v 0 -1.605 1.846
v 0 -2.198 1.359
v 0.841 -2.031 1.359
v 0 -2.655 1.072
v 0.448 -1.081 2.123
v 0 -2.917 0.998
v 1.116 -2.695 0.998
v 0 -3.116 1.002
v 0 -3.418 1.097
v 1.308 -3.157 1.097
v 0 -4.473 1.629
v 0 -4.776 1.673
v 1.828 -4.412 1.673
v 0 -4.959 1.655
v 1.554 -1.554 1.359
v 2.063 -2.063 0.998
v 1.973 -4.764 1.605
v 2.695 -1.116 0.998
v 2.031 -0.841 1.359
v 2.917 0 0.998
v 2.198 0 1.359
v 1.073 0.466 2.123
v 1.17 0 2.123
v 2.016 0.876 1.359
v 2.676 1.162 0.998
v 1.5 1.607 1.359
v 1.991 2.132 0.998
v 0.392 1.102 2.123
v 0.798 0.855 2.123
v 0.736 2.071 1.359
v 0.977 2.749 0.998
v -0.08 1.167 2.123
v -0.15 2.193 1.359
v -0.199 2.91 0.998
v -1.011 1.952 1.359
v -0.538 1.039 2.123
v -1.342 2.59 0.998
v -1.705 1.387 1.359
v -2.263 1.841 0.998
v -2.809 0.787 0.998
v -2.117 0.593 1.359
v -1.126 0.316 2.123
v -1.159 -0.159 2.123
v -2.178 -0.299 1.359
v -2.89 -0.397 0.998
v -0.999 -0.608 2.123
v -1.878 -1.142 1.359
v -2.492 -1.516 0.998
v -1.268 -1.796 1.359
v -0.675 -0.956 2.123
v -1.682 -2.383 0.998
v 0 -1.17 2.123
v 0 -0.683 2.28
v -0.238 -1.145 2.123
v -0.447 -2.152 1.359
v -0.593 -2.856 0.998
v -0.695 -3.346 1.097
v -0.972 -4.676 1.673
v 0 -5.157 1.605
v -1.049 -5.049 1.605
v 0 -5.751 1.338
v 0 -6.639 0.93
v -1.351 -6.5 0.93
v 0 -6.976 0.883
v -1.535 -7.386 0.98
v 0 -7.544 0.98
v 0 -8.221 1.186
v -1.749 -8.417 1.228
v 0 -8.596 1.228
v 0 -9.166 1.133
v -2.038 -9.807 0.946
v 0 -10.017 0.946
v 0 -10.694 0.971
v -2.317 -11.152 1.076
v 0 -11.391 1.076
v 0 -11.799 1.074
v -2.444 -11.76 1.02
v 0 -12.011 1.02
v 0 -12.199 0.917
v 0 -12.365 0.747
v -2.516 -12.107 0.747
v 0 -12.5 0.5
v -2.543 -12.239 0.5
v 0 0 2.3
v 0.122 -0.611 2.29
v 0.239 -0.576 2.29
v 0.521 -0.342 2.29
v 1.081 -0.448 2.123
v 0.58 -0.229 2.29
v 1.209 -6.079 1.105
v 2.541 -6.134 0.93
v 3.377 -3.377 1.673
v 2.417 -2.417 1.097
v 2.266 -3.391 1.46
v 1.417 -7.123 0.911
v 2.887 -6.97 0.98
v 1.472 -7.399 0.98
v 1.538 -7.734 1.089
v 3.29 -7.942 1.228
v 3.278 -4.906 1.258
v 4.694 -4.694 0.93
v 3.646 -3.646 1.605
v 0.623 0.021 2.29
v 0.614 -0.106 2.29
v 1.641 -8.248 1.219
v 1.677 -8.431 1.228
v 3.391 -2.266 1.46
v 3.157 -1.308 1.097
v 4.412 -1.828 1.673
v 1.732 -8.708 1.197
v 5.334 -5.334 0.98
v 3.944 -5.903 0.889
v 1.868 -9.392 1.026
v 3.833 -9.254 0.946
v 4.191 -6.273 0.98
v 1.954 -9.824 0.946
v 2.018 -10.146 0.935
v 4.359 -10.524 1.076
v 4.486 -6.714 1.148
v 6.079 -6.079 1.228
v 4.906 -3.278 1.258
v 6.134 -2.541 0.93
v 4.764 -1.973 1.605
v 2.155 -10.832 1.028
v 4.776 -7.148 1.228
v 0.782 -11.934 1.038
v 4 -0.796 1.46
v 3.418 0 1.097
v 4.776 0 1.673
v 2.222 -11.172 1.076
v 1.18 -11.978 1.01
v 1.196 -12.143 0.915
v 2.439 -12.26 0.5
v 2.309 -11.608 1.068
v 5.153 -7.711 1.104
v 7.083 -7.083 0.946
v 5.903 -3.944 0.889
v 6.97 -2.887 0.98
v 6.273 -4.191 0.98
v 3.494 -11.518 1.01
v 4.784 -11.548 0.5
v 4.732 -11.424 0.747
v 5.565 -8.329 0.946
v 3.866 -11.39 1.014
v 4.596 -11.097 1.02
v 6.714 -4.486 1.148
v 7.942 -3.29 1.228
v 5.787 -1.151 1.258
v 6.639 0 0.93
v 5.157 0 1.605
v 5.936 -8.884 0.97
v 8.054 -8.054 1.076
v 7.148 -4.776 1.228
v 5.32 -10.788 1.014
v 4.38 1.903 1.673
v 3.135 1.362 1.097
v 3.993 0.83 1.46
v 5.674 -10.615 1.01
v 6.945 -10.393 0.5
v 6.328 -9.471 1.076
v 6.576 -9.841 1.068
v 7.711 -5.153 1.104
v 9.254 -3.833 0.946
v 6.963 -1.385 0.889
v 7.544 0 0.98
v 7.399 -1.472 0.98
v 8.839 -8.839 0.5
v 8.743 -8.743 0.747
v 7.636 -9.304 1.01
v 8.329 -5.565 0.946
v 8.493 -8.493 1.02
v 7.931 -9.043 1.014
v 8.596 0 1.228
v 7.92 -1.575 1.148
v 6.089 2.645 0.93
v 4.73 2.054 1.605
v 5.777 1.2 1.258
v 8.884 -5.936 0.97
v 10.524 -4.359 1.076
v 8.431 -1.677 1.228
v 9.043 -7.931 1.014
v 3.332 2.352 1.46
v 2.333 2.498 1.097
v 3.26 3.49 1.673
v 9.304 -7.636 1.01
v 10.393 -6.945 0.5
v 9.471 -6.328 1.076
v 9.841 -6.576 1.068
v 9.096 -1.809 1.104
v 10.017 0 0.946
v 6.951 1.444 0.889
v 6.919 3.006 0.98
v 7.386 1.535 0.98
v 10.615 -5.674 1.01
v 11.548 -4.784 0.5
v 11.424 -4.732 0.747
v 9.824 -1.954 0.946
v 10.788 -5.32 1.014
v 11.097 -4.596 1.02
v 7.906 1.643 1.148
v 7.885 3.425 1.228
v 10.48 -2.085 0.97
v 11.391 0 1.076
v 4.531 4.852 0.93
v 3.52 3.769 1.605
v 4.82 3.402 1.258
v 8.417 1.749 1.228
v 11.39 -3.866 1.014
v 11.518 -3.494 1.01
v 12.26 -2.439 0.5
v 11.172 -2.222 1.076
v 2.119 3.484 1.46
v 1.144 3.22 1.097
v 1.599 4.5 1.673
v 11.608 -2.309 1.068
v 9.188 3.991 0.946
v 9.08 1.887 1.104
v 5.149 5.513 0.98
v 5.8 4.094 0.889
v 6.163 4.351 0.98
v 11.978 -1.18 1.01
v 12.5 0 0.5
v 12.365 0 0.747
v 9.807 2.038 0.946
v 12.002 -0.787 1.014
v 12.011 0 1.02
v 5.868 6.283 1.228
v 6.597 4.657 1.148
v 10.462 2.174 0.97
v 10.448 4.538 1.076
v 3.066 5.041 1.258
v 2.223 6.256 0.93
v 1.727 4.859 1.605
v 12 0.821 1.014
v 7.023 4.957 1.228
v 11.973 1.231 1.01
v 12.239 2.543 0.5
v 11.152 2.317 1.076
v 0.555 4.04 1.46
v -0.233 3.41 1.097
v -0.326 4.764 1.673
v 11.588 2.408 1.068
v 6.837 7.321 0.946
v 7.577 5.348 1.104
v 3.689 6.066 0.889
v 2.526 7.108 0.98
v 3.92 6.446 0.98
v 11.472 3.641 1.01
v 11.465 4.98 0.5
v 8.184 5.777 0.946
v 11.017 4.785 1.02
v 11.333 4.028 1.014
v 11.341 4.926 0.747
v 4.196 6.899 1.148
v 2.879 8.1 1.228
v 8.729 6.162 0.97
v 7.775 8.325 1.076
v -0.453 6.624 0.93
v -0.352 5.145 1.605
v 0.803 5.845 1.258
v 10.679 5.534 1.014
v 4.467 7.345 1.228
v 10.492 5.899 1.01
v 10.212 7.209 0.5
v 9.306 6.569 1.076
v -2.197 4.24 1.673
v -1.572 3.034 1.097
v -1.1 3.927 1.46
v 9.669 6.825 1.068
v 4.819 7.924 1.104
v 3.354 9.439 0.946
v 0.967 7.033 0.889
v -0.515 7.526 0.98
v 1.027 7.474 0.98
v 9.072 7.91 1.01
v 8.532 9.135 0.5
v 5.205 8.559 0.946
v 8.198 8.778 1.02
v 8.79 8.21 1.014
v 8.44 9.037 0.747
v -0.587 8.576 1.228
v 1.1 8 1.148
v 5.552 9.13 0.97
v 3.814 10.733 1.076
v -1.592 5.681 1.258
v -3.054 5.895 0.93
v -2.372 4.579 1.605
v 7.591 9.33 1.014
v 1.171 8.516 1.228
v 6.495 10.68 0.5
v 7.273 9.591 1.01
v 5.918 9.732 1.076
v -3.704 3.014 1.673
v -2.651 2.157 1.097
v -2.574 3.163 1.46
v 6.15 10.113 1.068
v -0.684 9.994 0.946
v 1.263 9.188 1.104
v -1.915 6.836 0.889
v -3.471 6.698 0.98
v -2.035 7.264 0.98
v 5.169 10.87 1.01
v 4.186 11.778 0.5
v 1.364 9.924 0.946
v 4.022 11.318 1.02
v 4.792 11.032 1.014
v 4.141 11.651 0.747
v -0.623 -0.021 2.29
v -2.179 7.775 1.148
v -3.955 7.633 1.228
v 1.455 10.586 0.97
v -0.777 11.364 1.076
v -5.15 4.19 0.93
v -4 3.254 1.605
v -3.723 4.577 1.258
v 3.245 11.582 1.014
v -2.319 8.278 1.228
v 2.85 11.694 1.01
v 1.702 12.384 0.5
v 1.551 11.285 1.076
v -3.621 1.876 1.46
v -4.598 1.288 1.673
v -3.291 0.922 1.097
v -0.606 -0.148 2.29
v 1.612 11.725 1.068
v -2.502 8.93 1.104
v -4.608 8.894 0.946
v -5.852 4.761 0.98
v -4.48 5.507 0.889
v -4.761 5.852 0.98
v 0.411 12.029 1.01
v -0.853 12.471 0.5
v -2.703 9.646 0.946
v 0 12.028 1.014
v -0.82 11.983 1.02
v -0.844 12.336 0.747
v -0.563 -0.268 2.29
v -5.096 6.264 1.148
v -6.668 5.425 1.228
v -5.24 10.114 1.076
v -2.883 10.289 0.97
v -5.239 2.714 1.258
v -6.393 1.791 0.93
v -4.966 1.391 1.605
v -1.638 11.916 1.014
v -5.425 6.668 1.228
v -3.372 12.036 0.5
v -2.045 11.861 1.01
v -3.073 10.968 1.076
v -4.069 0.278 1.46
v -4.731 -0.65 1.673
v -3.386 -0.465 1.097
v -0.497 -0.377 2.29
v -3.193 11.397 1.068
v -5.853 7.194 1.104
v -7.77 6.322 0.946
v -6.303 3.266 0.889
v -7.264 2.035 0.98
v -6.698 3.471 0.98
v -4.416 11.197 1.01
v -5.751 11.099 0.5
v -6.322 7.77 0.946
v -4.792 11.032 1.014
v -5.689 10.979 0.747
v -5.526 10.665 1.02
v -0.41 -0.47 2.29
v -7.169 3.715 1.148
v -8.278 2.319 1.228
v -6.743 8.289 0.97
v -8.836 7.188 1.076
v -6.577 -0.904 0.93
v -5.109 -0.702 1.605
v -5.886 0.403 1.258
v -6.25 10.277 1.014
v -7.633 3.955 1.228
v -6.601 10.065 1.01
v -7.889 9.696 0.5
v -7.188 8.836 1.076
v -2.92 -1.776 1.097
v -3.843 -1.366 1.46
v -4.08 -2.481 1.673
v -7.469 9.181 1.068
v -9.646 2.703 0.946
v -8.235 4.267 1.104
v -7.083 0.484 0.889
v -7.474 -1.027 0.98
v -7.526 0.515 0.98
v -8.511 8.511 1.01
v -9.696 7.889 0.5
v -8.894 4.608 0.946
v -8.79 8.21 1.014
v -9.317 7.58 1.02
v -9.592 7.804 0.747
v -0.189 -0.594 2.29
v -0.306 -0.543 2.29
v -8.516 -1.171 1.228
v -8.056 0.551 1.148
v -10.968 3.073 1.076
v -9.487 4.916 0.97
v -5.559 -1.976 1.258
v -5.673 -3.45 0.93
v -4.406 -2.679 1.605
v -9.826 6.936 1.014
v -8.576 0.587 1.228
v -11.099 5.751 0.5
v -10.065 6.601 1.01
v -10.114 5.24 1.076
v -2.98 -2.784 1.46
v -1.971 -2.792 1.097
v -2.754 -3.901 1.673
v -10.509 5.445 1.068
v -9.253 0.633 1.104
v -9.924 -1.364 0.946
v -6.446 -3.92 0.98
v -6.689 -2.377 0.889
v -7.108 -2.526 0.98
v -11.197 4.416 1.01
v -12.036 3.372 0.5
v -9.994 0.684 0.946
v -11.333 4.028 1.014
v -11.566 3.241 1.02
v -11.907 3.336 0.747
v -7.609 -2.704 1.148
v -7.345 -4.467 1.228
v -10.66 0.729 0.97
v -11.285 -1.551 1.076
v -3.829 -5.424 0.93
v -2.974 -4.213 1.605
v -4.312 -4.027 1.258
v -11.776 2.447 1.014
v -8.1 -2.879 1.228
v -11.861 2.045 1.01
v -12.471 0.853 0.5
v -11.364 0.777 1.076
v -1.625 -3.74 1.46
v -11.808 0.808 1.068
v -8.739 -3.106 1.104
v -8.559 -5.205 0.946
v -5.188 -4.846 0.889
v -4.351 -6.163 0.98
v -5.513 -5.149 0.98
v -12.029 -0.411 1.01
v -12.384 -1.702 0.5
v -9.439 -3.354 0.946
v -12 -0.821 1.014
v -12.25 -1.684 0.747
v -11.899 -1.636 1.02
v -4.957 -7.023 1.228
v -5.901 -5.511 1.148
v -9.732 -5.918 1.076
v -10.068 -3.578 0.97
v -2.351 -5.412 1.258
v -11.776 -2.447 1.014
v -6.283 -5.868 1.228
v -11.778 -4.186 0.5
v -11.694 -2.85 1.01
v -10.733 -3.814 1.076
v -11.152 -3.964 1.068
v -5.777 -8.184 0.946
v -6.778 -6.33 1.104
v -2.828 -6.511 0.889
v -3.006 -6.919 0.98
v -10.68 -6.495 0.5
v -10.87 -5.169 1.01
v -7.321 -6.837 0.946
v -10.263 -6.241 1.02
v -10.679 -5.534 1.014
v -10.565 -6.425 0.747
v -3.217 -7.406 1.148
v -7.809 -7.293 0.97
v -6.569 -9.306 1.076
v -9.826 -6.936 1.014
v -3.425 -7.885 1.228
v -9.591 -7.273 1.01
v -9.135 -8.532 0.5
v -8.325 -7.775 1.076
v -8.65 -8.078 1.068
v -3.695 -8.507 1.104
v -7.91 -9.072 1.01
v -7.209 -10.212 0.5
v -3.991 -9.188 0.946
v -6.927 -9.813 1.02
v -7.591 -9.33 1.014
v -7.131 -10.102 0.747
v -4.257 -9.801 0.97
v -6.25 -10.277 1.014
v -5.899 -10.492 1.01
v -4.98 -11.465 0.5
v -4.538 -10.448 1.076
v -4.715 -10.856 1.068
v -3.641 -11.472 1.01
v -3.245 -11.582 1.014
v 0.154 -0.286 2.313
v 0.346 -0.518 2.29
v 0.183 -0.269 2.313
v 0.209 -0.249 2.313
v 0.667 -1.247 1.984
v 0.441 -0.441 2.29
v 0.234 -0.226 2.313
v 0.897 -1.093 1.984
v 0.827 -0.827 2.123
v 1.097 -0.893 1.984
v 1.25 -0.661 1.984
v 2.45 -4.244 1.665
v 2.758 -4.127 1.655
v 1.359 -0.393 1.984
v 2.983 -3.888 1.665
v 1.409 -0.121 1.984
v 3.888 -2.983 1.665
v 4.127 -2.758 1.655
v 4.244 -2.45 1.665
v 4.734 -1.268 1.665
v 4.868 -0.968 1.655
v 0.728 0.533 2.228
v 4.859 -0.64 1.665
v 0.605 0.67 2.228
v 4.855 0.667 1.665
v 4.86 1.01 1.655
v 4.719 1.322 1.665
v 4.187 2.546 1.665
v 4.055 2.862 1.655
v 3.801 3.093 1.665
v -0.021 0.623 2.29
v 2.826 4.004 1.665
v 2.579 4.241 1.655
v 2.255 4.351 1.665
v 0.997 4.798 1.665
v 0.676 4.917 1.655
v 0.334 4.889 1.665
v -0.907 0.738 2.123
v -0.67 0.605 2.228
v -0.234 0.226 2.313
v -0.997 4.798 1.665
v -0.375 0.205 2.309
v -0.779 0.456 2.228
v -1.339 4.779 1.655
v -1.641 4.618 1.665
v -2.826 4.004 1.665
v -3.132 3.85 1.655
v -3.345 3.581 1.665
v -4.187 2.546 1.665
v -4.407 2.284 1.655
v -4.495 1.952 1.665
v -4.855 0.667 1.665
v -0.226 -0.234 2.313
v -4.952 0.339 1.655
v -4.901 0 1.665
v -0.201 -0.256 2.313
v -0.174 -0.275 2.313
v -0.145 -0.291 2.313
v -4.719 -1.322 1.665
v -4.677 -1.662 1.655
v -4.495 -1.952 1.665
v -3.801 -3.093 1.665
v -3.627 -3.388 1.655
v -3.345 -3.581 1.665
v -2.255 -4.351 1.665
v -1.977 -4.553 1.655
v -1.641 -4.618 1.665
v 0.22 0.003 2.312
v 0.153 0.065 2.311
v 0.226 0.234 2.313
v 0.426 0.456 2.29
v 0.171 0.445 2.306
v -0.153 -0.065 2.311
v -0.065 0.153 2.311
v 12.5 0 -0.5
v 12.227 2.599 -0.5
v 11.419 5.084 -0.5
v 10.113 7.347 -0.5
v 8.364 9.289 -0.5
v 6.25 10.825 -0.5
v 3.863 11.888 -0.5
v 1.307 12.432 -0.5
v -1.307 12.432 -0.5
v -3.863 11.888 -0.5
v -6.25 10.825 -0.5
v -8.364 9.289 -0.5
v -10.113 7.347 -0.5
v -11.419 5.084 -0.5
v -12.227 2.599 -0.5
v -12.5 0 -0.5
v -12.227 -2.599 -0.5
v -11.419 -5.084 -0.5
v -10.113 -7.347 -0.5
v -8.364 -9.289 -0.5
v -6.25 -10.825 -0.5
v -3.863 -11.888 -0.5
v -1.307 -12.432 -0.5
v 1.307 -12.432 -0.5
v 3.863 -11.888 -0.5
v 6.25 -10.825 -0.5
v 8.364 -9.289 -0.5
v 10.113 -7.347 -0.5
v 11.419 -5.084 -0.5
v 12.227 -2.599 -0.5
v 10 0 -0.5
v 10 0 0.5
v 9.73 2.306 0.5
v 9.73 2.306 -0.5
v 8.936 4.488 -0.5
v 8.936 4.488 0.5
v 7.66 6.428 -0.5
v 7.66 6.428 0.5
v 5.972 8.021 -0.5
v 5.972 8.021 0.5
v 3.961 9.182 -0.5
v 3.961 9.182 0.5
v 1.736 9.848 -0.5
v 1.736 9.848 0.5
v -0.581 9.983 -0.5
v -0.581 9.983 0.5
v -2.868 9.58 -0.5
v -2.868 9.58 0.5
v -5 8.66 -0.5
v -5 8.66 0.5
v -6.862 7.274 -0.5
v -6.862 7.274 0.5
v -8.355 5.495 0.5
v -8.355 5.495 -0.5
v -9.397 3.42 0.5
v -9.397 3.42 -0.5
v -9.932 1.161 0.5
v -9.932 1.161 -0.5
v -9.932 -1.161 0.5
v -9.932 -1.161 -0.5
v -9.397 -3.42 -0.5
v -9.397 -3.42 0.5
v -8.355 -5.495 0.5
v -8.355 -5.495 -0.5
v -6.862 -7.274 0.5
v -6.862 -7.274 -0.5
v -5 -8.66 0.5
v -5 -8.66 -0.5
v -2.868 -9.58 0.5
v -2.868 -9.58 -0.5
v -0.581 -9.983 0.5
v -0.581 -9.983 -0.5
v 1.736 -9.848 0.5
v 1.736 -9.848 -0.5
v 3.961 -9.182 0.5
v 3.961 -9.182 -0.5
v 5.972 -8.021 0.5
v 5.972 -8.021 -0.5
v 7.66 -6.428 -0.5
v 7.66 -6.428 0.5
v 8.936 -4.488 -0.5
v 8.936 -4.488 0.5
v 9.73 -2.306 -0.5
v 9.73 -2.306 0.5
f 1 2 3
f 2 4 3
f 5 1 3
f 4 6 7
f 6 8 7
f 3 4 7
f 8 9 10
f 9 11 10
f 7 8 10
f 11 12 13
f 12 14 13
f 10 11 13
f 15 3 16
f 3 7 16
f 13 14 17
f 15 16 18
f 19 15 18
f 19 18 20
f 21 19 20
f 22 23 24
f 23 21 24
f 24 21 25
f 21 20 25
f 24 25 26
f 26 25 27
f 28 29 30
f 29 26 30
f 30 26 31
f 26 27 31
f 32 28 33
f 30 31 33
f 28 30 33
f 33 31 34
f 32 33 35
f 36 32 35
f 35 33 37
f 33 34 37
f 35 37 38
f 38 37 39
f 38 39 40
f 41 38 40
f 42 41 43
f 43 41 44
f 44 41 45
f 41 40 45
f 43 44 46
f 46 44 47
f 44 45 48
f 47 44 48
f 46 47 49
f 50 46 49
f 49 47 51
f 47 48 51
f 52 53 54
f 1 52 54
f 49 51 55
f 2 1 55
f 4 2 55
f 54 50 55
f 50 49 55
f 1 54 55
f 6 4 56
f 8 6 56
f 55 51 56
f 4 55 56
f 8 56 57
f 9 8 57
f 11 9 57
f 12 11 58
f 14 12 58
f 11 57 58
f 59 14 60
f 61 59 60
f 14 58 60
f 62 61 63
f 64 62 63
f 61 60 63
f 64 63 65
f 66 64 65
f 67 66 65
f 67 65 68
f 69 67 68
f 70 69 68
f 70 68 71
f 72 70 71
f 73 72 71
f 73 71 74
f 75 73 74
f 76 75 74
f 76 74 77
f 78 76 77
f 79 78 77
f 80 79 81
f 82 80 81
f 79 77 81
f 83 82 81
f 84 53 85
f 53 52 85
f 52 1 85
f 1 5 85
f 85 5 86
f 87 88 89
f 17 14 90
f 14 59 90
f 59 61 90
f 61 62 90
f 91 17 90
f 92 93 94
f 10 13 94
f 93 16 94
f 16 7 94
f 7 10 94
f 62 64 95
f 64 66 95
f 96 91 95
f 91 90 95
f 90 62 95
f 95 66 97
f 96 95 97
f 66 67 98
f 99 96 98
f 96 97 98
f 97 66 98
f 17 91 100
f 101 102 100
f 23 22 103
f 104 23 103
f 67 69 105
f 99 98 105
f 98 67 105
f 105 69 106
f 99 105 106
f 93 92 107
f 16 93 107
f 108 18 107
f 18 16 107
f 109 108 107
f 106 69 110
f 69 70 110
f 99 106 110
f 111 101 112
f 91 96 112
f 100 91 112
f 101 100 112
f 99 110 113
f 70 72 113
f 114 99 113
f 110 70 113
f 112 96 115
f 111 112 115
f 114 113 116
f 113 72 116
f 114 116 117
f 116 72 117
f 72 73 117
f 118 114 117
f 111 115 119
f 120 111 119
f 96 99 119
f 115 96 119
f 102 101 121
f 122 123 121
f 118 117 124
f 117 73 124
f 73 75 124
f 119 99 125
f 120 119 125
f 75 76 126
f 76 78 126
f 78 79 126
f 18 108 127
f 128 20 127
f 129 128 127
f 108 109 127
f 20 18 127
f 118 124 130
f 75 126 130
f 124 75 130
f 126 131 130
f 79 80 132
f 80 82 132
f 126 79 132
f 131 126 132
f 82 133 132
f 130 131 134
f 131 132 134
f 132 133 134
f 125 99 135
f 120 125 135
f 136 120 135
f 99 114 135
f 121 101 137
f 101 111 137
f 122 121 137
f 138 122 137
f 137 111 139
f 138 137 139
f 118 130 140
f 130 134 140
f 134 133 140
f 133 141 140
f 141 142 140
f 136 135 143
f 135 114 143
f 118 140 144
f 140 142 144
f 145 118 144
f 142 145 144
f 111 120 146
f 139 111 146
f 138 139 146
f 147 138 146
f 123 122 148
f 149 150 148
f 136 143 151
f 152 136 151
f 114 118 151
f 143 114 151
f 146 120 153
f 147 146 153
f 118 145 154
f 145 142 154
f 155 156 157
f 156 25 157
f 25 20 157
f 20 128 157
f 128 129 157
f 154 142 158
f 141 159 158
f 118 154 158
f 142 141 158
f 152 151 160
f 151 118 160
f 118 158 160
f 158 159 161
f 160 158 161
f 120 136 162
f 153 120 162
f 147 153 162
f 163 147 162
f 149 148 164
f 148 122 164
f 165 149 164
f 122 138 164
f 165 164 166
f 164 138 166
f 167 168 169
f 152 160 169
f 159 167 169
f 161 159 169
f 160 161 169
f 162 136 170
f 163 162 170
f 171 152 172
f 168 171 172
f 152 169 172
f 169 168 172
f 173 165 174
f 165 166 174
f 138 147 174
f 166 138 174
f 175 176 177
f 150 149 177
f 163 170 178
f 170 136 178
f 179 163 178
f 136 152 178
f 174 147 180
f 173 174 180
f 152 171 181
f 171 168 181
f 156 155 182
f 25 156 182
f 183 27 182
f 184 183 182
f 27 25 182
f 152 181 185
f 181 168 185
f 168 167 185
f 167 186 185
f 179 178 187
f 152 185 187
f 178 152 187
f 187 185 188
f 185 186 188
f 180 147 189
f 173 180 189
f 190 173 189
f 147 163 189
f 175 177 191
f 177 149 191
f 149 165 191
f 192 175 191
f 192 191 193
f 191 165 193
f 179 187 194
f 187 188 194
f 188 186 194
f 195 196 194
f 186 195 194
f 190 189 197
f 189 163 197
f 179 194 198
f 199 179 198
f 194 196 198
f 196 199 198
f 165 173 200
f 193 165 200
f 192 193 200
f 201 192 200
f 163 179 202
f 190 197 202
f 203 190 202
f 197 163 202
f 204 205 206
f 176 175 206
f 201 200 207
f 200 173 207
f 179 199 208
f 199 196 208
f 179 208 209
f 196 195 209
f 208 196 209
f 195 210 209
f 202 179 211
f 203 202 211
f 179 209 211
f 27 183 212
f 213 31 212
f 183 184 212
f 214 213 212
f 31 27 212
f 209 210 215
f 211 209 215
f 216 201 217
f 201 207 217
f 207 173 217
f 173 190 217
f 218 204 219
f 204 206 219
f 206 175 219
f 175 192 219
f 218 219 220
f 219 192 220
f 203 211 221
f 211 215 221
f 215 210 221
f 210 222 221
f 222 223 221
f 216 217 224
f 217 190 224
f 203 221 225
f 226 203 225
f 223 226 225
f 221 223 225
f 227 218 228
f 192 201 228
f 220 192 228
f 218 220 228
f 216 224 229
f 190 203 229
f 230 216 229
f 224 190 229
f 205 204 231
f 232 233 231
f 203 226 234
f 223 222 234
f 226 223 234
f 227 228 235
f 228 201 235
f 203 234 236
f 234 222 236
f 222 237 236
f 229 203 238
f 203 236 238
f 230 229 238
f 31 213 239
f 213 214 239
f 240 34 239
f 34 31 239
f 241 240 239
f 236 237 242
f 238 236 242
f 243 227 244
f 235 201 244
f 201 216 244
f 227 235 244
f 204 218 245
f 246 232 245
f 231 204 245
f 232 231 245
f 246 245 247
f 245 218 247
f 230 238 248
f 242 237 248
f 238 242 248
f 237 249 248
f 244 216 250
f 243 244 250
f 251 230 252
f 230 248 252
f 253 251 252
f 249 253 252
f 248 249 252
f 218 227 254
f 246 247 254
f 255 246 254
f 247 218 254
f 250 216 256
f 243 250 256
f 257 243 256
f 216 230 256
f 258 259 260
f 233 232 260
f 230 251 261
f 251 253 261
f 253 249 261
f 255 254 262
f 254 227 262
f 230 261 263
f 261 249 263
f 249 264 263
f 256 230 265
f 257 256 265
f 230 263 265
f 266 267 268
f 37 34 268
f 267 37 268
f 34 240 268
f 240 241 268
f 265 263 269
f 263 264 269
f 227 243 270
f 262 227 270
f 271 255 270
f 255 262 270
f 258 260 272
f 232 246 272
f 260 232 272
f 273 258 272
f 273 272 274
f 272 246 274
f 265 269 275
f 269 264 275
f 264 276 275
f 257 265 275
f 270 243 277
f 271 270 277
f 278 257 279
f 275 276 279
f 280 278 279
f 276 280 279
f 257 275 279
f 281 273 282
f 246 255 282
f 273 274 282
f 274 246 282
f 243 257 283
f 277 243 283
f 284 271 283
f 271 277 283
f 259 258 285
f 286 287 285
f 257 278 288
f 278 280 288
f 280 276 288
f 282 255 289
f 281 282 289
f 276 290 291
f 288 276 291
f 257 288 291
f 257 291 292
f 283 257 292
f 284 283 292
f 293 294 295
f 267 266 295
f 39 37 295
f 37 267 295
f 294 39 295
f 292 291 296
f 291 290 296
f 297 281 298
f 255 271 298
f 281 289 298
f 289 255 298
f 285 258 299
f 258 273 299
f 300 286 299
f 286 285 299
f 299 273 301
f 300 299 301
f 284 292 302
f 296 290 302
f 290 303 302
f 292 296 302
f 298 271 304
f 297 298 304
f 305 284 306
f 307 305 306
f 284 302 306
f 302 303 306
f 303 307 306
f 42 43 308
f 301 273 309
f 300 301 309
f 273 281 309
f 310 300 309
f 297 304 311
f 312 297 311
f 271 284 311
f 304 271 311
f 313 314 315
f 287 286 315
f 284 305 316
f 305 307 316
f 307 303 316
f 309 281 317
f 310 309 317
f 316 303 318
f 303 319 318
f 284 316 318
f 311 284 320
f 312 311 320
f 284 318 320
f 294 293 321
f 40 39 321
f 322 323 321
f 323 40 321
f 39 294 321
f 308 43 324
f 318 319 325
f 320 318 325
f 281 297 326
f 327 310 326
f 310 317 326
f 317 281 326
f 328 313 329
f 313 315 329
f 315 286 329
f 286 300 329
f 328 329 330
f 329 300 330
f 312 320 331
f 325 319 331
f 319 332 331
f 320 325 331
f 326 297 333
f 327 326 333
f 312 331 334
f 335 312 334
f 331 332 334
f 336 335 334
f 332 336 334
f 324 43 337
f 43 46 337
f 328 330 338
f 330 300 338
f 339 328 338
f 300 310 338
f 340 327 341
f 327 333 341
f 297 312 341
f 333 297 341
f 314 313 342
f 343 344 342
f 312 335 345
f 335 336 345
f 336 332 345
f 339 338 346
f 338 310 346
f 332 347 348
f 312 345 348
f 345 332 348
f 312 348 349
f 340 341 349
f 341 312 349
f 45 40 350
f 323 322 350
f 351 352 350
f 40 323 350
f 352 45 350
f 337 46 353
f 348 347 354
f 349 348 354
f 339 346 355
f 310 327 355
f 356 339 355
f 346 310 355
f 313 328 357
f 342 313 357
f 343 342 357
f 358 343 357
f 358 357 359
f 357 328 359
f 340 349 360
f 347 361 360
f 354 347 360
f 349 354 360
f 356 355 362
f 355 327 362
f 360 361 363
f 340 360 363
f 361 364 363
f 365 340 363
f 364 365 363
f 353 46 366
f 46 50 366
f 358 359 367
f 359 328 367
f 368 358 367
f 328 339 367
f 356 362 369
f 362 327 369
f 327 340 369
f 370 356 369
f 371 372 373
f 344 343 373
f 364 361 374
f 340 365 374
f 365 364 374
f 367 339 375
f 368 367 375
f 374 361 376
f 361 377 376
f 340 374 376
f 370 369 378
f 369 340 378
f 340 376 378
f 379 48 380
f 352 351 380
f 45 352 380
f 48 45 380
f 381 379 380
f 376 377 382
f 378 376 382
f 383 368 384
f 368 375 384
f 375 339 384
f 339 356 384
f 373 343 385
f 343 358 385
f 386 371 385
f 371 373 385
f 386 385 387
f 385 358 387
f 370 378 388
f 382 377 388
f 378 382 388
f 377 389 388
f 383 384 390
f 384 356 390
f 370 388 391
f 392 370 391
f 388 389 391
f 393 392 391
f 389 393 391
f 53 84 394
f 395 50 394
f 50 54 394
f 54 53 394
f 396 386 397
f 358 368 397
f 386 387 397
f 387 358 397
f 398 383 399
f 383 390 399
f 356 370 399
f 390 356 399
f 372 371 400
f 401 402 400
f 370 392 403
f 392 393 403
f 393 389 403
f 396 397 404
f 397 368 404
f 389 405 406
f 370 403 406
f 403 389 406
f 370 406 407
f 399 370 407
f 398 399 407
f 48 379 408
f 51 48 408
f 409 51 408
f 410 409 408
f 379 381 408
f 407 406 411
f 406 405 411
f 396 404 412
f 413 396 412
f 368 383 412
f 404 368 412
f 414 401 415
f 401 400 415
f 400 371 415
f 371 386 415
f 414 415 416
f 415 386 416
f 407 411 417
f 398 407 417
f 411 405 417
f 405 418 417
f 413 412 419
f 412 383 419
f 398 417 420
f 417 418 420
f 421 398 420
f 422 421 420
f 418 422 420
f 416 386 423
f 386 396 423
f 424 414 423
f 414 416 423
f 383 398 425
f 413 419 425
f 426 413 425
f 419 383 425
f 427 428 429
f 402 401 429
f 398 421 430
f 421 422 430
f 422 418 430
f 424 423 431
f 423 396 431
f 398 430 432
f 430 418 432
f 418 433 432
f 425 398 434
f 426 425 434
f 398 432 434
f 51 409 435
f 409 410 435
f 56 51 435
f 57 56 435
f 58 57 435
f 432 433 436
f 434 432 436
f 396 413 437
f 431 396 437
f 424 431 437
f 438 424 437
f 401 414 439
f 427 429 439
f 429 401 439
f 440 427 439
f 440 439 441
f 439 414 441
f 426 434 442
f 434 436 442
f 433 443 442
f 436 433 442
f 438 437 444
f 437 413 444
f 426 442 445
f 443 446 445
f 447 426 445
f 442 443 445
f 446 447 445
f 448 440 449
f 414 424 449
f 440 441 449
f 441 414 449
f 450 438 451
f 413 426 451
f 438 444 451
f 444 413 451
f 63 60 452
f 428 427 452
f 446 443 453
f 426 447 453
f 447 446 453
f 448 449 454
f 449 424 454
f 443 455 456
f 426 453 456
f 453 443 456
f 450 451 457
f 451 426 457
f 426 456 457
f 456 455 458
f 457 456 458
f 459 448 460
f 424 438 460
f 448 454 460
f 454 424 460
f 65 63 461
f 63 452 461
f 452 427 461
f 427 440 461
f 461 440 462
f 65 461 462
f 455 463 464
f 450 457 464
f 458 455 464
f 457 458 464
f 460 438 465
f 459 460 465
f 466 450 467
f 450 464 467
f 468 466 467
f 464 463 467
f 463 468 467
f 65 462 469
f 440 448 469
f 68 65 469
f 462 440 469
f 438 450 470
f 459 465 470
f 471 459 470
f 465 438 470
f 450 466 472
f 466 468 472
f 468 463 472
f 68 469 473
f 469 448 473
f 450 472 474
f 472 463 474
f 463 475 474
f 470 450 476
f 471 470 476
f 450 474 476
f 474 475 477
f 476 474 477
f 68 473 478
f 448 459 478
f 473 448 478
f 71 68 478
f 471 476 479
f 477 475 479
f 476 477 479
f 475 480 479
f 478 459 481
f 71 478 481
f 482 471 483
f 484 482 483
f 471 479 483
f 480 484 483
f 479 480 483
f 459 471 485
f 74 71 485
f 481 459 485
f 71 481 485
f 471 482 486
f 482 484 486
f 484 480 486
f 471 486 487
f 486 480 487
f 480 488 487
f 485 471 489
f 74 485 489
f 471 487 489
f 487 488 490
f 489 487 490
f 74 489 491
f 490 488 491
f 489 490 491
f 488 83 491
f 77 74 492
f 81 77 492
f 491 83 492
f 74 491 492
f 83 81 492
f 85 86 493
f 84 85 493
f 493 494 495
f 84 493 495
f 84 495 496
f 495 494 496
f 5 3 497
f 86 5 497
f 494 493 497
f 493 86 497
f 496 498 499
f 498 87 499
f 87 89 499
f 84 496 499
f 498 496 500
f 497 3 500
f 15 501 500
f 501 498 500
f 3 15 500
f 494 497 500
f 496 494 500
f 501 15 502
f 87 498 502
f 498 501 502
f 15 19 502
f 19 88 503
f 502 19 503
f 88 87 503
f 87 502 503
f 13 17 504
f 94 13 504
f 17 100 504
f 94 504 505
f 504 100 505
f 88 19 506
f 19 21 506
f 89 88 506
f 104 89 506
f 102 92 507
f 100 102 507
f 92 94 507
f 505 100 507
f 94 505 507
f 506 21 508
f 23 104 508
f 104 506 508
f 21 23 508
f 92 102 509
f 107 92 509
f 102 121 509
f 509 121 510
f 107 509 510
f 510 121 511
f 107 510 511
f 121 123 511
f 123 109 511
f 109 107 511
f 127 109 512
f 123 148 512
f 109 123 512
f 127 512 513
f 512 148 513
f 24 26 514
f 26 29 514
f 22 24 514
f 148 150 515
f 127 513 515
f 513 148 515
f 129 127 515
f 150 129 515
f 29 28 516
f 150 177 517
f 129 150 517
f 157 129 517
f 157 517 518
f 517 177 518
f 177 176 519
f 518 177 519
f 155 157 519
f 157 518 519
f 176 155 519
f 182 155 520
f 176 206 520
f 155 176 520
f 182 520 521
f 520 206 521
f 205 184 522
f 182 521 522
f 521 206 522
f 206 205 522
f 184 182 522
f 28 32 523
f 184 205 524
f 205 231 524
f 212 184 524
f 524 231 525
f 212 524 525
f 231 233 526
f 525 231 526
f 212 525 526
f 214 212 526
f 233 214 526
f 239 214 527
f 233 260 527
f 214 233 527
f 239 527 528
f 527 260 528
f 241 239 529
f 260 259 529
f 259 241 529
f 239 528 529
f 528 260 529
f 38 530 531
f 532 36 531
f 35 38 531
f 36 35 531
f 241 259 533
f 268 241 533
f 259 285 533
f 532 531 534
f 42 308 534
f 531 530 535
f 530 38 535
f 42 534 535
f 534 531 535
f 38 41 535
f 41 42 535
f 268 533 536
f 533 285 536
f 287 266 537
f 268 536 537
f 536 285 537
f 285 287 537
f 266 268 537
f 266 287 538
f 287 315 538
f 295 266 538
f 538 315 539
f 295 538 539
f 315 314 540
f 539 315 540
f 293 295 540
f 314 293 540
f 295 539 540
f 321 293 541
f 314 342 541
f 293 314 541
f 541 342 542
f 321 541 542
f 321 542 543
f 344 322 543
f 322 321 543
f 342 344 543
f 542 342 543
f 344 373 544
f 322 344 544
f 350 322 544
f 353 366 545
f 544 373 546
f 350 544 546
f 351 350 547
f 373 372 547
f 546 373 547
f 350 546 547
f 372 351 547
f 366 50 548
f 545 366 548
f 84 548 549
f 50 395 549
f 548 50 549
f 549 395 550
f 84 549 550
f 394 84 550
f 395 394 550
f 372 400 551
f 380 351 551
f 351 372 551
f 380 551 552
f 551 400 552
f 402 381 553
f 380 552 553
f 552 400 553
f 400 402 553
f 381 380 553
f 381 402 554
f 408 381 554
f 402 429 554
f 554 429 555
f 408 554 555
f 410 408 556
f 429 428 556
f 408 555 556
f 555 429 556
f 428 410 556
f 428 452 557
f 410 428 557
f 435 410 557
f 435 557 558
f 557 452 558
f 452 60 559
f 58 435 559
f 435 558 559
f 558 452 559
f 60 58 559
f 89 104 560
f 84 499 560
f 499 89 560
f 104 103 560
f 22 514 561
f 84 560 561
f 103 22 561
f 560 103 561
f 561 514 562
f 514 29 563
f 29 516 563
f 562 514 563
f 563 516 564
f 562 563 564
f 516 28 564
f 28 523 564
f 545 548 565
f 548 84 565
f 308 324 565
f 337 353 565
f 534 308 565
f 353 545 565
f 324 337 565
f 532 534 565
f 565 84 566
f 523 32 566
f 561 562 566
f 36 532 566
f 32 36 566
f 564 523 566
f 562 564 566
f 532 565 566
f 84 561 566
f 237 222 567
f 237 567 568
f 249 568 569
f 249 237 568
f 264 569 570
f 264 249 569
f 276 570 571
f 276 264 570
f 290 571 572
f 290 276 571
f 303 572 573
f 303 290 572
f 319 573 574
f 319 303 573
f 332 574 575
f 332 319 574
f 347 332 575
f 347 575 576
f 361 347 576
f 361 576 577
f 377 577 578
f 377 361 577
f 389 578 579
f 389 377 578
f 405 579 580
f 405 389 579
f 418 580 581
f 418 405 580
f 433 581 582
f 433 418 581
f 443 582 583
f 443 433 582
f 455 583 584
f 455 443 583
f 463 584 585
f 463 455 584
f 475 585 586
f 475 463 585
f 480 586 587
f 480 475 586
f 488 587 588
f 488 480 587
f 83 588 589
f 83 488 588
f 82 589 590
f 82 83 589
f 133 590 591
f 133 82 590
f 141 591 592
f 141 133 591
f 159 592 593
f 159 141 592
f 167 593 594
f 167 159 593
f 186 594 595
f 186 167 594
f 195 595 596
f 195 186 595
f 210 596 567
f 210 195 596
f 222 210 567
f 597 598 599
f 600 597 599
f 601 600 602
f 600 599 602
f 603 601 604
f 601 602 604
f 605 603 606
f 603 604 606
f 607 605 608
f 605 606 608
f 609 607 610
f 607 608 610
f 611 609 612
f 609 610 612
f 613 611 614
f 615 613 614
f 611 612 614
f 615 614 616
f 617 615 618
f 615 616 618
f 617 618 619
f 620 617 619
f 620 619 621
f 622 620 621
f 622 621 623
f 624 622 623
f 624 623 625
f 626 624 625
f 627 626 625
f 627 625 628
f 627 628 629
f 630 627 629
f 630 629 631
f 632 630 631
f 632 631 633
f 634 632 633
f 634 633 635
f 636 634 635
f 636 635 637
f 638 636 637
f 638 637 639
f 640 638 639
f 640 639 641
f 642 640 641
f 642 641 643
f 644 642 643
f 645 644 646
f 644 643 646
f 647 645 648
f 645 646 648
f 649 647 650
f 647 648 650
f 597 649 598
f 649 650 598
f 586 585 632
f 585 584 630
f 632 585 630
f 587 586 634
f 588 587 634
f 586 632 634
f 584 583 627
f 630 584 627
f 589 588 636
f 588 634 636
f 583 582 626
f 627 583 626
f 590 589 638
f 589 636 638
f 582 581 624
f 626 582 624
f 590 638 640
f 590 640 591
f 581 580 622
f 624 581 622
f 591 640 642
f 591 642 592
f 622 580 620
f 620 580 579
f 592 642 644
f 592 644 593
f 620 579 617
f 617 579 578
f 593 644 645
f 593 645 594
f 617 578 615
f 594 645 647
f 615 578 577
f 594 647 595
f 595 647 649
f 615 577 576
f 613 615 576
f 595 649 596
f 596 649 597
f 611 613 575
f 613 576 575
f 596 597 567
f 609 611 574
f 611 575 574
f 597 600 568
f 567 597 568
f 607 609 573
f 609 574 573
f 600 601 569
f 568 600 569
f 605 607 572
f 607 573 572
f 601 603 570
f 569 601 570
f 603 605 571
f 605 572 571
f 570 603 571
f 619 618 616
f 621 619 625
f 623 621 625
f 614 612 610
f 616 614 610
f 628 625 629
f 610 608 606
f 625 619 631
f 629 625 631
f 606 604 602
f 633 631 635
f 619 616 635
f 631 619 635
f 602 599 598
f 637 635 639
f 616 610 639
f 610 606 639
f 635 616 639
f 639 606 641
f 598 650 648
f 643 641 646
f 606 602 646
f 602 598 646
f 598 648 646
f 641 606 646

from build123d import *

# Parameters (mm, degrees)
F0_R          = 12.5
F1_DEPTH      = 0.5
F1_DEPTH_BACK = 0.5
F2_R          = 10
F3_DEPTH      = 25


with BuildPart() as f1:
    # F0 (on Top) → F1 (new body, two sides)
    with BuildSketch(Plane.XY) as f1_sk:
        Circle(F0_R)
    extrude(amount=F1_DEPTH)
    extrude(f1_sk.sketch, amount=-F1_DEPTH_BACK)

    # F2 (on face) → F3 (cut)
    with BuildSketch(Plane.XY.offset(0.5)):
        Circle(F2_R)
    extrude(amount=-F3_DEPTH, mode=Mode.SUBTRACT)

    # F4 (on Right) → F5 (revolve)
    with BuildSketch(Plane.YZ):
        with BuildLine():
            add(Edge.make_bspline(
                [(0, 2.3), (-0.5863639585, 2.3508427839), (-1.4990472159, 2.1589461264), (-2.9973770587, 0.3658457695), (-4.7266114084, 2.3487976007), (-6.7693691414, 0.3710648295), (-8.5187679971, 1.5983260061), (-10.2312680267, 0.5210206799), (-12.1127263009, 1.4507284424), (-12.5, 0.5)],
                knots=[0, 0, 0, 0, 0.128486707, 0.268776546, 0.4101902637, 0.5655004063, 0.7023153284, 0.8455539218, 1, 1, 1, 1], degree=3))
            Line((-12.5, 0.5), (0, 0.5))
            Line((0, 0.5), (0, 2.3))
        make_face()
    revolve(axis=Axis((0, 0, 1.4), (0, 0, 1)))


solid = f1.part
